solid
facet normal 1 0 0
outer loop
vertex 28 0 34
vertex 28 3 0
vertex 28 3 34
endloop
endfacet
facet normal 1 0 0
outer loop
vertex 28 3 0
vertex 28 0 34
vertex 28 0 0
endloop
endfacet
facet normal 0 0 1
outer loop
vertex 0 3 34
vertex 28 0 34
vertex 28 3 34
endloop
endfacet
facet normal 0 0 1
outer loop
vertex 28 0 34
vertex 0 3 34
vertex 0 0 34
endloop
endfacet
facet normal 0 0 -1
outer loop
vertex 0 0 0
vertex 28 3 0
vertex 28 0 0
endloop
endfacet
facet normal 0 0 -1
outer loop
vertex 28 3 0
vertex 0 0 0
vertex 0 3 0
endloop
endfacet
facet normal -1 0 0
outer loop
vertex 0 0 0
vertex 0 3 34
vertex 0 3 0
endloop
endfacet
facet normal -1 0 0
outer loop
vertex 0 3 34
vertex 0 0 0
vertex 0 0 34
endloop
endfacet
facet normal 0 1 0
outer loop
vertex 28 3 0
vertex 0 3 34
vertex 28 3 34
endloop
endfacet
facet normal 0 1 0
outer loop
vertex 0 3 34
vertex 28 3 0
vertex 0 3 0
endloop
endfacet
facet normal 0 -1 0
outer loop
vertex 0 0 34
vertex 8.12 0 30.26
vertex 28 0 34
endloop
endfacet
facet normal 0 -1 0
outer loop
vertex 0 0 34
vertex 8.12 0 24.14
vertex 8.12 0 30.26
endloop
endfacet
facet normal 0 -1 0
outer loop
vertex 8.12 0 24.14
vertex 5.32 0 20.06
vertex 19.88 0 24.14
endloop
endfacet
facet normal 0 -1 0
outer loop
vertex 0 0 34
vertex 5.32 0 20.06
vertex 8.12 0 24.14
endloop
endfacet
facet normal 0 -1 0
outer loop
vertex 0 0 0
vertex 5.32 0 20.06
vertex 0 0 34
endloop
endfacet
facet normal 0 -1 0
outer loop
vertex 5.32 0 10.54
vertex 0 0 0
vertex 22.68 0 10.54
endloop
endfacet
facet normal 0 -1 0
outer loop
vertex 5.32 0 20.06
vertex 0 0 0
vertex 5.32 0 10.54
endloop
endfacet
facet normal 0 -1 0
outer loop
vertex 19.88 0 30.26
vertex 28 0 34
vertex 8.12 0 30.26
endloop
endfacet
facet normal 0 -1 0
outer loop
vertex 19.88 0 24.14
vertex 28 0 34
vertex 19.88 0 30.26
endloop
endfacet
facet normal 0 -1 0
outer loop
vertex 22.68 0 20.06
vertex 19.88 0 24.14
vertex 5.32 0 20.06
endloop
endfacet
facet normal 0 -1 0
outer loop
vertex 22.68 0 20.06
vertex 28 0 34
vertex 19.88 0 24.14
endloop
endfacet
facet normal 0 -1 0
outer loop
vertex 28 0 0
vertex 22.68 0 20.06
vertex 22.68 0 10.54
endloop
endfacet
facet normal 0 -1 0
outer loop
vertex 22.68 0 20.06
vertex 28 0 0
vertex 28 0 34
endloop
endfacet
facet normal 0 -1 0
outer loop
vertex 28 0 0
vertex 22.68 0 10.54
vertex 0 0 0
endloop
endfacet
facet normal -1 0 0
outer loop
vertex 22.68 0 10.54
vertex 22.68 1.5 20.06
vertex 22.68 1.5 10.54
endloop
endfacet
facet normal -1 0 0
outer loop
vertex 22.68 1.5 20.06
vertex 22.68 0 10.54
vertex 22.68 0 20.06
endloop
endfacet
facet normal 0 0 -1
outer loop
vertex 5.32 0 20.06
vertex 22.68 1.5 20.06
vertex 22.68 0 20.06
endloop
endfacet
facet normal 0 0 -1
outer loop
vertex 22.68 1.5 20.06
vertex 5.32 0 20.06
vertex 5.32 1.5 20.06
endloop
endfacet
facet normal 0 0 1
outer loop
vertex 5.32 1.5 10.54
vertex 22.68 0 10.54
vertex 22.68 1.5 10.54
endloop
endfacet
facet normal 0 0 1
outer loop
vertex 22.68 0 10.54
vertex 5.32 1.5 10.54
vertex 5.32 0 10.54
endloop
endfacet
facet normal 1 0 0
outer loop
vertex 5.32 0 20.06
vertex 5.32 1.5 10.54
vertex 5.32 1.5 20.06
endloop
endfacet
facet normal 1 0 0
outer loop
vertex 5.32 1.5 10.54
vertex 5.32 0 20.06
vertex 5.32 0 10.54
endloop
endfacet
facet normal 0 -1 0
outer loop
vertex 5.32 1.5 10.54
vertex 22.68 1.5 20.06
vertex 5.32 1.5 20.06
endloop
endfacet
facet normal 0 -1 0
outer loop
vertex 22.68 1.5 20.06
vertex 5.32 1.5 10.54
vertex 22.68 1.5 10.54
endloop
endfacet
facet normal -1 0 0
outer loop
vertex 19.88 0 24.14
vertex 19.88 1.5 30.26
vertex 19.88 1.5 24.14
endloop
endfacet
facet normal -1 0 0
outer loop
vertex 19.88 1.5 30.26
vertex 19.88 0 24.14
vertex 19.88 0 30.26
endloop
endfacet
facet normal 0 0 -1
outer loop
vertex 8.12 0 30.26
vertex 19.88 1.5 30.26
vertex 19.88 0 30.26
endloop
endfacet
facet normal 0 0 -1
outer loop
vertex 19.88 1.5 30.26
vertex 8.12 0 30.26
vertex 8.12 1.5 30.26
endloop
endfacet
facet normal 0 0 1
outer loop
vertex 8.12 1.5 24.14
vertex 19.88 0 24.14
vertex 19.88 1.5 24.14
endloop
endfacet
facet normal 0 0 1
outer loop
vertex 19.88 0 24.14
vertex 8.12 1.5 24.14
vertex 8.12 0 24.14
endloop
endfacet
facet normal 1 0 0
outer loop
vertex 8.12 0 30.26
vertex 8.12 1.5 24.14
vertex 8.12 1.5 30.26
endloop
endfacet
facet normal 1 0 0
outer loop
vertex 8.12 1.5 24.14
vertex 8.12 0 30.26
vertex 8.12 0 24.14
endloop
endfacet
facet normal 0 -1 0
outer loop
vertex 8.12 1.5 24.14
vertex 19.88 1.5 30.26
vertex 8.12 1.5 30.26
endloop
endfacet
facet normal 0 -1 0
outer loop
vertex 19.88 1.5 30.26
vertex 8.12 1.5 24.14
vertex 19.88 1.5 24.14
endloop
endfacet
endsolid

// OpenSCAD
// DIN-rail retaining clip.
$fn = 60;
eps = 0.02;
clip_w = 28;
clip_h = 34;
clip_t = 3;
difference() { cube([clip_w,clip_t,clip_h]); translate([clip_w/2, -eps, clip_h*0.45]) cube([clip_w*0.62,clip_t+2*eps,clip_h*0.28],center=true); translate([clip_w/2, -eps, clip_h*0.8]) cube([clip_w*0.42,clip_t+2*eps,clip_h*0.18],center=true); }
